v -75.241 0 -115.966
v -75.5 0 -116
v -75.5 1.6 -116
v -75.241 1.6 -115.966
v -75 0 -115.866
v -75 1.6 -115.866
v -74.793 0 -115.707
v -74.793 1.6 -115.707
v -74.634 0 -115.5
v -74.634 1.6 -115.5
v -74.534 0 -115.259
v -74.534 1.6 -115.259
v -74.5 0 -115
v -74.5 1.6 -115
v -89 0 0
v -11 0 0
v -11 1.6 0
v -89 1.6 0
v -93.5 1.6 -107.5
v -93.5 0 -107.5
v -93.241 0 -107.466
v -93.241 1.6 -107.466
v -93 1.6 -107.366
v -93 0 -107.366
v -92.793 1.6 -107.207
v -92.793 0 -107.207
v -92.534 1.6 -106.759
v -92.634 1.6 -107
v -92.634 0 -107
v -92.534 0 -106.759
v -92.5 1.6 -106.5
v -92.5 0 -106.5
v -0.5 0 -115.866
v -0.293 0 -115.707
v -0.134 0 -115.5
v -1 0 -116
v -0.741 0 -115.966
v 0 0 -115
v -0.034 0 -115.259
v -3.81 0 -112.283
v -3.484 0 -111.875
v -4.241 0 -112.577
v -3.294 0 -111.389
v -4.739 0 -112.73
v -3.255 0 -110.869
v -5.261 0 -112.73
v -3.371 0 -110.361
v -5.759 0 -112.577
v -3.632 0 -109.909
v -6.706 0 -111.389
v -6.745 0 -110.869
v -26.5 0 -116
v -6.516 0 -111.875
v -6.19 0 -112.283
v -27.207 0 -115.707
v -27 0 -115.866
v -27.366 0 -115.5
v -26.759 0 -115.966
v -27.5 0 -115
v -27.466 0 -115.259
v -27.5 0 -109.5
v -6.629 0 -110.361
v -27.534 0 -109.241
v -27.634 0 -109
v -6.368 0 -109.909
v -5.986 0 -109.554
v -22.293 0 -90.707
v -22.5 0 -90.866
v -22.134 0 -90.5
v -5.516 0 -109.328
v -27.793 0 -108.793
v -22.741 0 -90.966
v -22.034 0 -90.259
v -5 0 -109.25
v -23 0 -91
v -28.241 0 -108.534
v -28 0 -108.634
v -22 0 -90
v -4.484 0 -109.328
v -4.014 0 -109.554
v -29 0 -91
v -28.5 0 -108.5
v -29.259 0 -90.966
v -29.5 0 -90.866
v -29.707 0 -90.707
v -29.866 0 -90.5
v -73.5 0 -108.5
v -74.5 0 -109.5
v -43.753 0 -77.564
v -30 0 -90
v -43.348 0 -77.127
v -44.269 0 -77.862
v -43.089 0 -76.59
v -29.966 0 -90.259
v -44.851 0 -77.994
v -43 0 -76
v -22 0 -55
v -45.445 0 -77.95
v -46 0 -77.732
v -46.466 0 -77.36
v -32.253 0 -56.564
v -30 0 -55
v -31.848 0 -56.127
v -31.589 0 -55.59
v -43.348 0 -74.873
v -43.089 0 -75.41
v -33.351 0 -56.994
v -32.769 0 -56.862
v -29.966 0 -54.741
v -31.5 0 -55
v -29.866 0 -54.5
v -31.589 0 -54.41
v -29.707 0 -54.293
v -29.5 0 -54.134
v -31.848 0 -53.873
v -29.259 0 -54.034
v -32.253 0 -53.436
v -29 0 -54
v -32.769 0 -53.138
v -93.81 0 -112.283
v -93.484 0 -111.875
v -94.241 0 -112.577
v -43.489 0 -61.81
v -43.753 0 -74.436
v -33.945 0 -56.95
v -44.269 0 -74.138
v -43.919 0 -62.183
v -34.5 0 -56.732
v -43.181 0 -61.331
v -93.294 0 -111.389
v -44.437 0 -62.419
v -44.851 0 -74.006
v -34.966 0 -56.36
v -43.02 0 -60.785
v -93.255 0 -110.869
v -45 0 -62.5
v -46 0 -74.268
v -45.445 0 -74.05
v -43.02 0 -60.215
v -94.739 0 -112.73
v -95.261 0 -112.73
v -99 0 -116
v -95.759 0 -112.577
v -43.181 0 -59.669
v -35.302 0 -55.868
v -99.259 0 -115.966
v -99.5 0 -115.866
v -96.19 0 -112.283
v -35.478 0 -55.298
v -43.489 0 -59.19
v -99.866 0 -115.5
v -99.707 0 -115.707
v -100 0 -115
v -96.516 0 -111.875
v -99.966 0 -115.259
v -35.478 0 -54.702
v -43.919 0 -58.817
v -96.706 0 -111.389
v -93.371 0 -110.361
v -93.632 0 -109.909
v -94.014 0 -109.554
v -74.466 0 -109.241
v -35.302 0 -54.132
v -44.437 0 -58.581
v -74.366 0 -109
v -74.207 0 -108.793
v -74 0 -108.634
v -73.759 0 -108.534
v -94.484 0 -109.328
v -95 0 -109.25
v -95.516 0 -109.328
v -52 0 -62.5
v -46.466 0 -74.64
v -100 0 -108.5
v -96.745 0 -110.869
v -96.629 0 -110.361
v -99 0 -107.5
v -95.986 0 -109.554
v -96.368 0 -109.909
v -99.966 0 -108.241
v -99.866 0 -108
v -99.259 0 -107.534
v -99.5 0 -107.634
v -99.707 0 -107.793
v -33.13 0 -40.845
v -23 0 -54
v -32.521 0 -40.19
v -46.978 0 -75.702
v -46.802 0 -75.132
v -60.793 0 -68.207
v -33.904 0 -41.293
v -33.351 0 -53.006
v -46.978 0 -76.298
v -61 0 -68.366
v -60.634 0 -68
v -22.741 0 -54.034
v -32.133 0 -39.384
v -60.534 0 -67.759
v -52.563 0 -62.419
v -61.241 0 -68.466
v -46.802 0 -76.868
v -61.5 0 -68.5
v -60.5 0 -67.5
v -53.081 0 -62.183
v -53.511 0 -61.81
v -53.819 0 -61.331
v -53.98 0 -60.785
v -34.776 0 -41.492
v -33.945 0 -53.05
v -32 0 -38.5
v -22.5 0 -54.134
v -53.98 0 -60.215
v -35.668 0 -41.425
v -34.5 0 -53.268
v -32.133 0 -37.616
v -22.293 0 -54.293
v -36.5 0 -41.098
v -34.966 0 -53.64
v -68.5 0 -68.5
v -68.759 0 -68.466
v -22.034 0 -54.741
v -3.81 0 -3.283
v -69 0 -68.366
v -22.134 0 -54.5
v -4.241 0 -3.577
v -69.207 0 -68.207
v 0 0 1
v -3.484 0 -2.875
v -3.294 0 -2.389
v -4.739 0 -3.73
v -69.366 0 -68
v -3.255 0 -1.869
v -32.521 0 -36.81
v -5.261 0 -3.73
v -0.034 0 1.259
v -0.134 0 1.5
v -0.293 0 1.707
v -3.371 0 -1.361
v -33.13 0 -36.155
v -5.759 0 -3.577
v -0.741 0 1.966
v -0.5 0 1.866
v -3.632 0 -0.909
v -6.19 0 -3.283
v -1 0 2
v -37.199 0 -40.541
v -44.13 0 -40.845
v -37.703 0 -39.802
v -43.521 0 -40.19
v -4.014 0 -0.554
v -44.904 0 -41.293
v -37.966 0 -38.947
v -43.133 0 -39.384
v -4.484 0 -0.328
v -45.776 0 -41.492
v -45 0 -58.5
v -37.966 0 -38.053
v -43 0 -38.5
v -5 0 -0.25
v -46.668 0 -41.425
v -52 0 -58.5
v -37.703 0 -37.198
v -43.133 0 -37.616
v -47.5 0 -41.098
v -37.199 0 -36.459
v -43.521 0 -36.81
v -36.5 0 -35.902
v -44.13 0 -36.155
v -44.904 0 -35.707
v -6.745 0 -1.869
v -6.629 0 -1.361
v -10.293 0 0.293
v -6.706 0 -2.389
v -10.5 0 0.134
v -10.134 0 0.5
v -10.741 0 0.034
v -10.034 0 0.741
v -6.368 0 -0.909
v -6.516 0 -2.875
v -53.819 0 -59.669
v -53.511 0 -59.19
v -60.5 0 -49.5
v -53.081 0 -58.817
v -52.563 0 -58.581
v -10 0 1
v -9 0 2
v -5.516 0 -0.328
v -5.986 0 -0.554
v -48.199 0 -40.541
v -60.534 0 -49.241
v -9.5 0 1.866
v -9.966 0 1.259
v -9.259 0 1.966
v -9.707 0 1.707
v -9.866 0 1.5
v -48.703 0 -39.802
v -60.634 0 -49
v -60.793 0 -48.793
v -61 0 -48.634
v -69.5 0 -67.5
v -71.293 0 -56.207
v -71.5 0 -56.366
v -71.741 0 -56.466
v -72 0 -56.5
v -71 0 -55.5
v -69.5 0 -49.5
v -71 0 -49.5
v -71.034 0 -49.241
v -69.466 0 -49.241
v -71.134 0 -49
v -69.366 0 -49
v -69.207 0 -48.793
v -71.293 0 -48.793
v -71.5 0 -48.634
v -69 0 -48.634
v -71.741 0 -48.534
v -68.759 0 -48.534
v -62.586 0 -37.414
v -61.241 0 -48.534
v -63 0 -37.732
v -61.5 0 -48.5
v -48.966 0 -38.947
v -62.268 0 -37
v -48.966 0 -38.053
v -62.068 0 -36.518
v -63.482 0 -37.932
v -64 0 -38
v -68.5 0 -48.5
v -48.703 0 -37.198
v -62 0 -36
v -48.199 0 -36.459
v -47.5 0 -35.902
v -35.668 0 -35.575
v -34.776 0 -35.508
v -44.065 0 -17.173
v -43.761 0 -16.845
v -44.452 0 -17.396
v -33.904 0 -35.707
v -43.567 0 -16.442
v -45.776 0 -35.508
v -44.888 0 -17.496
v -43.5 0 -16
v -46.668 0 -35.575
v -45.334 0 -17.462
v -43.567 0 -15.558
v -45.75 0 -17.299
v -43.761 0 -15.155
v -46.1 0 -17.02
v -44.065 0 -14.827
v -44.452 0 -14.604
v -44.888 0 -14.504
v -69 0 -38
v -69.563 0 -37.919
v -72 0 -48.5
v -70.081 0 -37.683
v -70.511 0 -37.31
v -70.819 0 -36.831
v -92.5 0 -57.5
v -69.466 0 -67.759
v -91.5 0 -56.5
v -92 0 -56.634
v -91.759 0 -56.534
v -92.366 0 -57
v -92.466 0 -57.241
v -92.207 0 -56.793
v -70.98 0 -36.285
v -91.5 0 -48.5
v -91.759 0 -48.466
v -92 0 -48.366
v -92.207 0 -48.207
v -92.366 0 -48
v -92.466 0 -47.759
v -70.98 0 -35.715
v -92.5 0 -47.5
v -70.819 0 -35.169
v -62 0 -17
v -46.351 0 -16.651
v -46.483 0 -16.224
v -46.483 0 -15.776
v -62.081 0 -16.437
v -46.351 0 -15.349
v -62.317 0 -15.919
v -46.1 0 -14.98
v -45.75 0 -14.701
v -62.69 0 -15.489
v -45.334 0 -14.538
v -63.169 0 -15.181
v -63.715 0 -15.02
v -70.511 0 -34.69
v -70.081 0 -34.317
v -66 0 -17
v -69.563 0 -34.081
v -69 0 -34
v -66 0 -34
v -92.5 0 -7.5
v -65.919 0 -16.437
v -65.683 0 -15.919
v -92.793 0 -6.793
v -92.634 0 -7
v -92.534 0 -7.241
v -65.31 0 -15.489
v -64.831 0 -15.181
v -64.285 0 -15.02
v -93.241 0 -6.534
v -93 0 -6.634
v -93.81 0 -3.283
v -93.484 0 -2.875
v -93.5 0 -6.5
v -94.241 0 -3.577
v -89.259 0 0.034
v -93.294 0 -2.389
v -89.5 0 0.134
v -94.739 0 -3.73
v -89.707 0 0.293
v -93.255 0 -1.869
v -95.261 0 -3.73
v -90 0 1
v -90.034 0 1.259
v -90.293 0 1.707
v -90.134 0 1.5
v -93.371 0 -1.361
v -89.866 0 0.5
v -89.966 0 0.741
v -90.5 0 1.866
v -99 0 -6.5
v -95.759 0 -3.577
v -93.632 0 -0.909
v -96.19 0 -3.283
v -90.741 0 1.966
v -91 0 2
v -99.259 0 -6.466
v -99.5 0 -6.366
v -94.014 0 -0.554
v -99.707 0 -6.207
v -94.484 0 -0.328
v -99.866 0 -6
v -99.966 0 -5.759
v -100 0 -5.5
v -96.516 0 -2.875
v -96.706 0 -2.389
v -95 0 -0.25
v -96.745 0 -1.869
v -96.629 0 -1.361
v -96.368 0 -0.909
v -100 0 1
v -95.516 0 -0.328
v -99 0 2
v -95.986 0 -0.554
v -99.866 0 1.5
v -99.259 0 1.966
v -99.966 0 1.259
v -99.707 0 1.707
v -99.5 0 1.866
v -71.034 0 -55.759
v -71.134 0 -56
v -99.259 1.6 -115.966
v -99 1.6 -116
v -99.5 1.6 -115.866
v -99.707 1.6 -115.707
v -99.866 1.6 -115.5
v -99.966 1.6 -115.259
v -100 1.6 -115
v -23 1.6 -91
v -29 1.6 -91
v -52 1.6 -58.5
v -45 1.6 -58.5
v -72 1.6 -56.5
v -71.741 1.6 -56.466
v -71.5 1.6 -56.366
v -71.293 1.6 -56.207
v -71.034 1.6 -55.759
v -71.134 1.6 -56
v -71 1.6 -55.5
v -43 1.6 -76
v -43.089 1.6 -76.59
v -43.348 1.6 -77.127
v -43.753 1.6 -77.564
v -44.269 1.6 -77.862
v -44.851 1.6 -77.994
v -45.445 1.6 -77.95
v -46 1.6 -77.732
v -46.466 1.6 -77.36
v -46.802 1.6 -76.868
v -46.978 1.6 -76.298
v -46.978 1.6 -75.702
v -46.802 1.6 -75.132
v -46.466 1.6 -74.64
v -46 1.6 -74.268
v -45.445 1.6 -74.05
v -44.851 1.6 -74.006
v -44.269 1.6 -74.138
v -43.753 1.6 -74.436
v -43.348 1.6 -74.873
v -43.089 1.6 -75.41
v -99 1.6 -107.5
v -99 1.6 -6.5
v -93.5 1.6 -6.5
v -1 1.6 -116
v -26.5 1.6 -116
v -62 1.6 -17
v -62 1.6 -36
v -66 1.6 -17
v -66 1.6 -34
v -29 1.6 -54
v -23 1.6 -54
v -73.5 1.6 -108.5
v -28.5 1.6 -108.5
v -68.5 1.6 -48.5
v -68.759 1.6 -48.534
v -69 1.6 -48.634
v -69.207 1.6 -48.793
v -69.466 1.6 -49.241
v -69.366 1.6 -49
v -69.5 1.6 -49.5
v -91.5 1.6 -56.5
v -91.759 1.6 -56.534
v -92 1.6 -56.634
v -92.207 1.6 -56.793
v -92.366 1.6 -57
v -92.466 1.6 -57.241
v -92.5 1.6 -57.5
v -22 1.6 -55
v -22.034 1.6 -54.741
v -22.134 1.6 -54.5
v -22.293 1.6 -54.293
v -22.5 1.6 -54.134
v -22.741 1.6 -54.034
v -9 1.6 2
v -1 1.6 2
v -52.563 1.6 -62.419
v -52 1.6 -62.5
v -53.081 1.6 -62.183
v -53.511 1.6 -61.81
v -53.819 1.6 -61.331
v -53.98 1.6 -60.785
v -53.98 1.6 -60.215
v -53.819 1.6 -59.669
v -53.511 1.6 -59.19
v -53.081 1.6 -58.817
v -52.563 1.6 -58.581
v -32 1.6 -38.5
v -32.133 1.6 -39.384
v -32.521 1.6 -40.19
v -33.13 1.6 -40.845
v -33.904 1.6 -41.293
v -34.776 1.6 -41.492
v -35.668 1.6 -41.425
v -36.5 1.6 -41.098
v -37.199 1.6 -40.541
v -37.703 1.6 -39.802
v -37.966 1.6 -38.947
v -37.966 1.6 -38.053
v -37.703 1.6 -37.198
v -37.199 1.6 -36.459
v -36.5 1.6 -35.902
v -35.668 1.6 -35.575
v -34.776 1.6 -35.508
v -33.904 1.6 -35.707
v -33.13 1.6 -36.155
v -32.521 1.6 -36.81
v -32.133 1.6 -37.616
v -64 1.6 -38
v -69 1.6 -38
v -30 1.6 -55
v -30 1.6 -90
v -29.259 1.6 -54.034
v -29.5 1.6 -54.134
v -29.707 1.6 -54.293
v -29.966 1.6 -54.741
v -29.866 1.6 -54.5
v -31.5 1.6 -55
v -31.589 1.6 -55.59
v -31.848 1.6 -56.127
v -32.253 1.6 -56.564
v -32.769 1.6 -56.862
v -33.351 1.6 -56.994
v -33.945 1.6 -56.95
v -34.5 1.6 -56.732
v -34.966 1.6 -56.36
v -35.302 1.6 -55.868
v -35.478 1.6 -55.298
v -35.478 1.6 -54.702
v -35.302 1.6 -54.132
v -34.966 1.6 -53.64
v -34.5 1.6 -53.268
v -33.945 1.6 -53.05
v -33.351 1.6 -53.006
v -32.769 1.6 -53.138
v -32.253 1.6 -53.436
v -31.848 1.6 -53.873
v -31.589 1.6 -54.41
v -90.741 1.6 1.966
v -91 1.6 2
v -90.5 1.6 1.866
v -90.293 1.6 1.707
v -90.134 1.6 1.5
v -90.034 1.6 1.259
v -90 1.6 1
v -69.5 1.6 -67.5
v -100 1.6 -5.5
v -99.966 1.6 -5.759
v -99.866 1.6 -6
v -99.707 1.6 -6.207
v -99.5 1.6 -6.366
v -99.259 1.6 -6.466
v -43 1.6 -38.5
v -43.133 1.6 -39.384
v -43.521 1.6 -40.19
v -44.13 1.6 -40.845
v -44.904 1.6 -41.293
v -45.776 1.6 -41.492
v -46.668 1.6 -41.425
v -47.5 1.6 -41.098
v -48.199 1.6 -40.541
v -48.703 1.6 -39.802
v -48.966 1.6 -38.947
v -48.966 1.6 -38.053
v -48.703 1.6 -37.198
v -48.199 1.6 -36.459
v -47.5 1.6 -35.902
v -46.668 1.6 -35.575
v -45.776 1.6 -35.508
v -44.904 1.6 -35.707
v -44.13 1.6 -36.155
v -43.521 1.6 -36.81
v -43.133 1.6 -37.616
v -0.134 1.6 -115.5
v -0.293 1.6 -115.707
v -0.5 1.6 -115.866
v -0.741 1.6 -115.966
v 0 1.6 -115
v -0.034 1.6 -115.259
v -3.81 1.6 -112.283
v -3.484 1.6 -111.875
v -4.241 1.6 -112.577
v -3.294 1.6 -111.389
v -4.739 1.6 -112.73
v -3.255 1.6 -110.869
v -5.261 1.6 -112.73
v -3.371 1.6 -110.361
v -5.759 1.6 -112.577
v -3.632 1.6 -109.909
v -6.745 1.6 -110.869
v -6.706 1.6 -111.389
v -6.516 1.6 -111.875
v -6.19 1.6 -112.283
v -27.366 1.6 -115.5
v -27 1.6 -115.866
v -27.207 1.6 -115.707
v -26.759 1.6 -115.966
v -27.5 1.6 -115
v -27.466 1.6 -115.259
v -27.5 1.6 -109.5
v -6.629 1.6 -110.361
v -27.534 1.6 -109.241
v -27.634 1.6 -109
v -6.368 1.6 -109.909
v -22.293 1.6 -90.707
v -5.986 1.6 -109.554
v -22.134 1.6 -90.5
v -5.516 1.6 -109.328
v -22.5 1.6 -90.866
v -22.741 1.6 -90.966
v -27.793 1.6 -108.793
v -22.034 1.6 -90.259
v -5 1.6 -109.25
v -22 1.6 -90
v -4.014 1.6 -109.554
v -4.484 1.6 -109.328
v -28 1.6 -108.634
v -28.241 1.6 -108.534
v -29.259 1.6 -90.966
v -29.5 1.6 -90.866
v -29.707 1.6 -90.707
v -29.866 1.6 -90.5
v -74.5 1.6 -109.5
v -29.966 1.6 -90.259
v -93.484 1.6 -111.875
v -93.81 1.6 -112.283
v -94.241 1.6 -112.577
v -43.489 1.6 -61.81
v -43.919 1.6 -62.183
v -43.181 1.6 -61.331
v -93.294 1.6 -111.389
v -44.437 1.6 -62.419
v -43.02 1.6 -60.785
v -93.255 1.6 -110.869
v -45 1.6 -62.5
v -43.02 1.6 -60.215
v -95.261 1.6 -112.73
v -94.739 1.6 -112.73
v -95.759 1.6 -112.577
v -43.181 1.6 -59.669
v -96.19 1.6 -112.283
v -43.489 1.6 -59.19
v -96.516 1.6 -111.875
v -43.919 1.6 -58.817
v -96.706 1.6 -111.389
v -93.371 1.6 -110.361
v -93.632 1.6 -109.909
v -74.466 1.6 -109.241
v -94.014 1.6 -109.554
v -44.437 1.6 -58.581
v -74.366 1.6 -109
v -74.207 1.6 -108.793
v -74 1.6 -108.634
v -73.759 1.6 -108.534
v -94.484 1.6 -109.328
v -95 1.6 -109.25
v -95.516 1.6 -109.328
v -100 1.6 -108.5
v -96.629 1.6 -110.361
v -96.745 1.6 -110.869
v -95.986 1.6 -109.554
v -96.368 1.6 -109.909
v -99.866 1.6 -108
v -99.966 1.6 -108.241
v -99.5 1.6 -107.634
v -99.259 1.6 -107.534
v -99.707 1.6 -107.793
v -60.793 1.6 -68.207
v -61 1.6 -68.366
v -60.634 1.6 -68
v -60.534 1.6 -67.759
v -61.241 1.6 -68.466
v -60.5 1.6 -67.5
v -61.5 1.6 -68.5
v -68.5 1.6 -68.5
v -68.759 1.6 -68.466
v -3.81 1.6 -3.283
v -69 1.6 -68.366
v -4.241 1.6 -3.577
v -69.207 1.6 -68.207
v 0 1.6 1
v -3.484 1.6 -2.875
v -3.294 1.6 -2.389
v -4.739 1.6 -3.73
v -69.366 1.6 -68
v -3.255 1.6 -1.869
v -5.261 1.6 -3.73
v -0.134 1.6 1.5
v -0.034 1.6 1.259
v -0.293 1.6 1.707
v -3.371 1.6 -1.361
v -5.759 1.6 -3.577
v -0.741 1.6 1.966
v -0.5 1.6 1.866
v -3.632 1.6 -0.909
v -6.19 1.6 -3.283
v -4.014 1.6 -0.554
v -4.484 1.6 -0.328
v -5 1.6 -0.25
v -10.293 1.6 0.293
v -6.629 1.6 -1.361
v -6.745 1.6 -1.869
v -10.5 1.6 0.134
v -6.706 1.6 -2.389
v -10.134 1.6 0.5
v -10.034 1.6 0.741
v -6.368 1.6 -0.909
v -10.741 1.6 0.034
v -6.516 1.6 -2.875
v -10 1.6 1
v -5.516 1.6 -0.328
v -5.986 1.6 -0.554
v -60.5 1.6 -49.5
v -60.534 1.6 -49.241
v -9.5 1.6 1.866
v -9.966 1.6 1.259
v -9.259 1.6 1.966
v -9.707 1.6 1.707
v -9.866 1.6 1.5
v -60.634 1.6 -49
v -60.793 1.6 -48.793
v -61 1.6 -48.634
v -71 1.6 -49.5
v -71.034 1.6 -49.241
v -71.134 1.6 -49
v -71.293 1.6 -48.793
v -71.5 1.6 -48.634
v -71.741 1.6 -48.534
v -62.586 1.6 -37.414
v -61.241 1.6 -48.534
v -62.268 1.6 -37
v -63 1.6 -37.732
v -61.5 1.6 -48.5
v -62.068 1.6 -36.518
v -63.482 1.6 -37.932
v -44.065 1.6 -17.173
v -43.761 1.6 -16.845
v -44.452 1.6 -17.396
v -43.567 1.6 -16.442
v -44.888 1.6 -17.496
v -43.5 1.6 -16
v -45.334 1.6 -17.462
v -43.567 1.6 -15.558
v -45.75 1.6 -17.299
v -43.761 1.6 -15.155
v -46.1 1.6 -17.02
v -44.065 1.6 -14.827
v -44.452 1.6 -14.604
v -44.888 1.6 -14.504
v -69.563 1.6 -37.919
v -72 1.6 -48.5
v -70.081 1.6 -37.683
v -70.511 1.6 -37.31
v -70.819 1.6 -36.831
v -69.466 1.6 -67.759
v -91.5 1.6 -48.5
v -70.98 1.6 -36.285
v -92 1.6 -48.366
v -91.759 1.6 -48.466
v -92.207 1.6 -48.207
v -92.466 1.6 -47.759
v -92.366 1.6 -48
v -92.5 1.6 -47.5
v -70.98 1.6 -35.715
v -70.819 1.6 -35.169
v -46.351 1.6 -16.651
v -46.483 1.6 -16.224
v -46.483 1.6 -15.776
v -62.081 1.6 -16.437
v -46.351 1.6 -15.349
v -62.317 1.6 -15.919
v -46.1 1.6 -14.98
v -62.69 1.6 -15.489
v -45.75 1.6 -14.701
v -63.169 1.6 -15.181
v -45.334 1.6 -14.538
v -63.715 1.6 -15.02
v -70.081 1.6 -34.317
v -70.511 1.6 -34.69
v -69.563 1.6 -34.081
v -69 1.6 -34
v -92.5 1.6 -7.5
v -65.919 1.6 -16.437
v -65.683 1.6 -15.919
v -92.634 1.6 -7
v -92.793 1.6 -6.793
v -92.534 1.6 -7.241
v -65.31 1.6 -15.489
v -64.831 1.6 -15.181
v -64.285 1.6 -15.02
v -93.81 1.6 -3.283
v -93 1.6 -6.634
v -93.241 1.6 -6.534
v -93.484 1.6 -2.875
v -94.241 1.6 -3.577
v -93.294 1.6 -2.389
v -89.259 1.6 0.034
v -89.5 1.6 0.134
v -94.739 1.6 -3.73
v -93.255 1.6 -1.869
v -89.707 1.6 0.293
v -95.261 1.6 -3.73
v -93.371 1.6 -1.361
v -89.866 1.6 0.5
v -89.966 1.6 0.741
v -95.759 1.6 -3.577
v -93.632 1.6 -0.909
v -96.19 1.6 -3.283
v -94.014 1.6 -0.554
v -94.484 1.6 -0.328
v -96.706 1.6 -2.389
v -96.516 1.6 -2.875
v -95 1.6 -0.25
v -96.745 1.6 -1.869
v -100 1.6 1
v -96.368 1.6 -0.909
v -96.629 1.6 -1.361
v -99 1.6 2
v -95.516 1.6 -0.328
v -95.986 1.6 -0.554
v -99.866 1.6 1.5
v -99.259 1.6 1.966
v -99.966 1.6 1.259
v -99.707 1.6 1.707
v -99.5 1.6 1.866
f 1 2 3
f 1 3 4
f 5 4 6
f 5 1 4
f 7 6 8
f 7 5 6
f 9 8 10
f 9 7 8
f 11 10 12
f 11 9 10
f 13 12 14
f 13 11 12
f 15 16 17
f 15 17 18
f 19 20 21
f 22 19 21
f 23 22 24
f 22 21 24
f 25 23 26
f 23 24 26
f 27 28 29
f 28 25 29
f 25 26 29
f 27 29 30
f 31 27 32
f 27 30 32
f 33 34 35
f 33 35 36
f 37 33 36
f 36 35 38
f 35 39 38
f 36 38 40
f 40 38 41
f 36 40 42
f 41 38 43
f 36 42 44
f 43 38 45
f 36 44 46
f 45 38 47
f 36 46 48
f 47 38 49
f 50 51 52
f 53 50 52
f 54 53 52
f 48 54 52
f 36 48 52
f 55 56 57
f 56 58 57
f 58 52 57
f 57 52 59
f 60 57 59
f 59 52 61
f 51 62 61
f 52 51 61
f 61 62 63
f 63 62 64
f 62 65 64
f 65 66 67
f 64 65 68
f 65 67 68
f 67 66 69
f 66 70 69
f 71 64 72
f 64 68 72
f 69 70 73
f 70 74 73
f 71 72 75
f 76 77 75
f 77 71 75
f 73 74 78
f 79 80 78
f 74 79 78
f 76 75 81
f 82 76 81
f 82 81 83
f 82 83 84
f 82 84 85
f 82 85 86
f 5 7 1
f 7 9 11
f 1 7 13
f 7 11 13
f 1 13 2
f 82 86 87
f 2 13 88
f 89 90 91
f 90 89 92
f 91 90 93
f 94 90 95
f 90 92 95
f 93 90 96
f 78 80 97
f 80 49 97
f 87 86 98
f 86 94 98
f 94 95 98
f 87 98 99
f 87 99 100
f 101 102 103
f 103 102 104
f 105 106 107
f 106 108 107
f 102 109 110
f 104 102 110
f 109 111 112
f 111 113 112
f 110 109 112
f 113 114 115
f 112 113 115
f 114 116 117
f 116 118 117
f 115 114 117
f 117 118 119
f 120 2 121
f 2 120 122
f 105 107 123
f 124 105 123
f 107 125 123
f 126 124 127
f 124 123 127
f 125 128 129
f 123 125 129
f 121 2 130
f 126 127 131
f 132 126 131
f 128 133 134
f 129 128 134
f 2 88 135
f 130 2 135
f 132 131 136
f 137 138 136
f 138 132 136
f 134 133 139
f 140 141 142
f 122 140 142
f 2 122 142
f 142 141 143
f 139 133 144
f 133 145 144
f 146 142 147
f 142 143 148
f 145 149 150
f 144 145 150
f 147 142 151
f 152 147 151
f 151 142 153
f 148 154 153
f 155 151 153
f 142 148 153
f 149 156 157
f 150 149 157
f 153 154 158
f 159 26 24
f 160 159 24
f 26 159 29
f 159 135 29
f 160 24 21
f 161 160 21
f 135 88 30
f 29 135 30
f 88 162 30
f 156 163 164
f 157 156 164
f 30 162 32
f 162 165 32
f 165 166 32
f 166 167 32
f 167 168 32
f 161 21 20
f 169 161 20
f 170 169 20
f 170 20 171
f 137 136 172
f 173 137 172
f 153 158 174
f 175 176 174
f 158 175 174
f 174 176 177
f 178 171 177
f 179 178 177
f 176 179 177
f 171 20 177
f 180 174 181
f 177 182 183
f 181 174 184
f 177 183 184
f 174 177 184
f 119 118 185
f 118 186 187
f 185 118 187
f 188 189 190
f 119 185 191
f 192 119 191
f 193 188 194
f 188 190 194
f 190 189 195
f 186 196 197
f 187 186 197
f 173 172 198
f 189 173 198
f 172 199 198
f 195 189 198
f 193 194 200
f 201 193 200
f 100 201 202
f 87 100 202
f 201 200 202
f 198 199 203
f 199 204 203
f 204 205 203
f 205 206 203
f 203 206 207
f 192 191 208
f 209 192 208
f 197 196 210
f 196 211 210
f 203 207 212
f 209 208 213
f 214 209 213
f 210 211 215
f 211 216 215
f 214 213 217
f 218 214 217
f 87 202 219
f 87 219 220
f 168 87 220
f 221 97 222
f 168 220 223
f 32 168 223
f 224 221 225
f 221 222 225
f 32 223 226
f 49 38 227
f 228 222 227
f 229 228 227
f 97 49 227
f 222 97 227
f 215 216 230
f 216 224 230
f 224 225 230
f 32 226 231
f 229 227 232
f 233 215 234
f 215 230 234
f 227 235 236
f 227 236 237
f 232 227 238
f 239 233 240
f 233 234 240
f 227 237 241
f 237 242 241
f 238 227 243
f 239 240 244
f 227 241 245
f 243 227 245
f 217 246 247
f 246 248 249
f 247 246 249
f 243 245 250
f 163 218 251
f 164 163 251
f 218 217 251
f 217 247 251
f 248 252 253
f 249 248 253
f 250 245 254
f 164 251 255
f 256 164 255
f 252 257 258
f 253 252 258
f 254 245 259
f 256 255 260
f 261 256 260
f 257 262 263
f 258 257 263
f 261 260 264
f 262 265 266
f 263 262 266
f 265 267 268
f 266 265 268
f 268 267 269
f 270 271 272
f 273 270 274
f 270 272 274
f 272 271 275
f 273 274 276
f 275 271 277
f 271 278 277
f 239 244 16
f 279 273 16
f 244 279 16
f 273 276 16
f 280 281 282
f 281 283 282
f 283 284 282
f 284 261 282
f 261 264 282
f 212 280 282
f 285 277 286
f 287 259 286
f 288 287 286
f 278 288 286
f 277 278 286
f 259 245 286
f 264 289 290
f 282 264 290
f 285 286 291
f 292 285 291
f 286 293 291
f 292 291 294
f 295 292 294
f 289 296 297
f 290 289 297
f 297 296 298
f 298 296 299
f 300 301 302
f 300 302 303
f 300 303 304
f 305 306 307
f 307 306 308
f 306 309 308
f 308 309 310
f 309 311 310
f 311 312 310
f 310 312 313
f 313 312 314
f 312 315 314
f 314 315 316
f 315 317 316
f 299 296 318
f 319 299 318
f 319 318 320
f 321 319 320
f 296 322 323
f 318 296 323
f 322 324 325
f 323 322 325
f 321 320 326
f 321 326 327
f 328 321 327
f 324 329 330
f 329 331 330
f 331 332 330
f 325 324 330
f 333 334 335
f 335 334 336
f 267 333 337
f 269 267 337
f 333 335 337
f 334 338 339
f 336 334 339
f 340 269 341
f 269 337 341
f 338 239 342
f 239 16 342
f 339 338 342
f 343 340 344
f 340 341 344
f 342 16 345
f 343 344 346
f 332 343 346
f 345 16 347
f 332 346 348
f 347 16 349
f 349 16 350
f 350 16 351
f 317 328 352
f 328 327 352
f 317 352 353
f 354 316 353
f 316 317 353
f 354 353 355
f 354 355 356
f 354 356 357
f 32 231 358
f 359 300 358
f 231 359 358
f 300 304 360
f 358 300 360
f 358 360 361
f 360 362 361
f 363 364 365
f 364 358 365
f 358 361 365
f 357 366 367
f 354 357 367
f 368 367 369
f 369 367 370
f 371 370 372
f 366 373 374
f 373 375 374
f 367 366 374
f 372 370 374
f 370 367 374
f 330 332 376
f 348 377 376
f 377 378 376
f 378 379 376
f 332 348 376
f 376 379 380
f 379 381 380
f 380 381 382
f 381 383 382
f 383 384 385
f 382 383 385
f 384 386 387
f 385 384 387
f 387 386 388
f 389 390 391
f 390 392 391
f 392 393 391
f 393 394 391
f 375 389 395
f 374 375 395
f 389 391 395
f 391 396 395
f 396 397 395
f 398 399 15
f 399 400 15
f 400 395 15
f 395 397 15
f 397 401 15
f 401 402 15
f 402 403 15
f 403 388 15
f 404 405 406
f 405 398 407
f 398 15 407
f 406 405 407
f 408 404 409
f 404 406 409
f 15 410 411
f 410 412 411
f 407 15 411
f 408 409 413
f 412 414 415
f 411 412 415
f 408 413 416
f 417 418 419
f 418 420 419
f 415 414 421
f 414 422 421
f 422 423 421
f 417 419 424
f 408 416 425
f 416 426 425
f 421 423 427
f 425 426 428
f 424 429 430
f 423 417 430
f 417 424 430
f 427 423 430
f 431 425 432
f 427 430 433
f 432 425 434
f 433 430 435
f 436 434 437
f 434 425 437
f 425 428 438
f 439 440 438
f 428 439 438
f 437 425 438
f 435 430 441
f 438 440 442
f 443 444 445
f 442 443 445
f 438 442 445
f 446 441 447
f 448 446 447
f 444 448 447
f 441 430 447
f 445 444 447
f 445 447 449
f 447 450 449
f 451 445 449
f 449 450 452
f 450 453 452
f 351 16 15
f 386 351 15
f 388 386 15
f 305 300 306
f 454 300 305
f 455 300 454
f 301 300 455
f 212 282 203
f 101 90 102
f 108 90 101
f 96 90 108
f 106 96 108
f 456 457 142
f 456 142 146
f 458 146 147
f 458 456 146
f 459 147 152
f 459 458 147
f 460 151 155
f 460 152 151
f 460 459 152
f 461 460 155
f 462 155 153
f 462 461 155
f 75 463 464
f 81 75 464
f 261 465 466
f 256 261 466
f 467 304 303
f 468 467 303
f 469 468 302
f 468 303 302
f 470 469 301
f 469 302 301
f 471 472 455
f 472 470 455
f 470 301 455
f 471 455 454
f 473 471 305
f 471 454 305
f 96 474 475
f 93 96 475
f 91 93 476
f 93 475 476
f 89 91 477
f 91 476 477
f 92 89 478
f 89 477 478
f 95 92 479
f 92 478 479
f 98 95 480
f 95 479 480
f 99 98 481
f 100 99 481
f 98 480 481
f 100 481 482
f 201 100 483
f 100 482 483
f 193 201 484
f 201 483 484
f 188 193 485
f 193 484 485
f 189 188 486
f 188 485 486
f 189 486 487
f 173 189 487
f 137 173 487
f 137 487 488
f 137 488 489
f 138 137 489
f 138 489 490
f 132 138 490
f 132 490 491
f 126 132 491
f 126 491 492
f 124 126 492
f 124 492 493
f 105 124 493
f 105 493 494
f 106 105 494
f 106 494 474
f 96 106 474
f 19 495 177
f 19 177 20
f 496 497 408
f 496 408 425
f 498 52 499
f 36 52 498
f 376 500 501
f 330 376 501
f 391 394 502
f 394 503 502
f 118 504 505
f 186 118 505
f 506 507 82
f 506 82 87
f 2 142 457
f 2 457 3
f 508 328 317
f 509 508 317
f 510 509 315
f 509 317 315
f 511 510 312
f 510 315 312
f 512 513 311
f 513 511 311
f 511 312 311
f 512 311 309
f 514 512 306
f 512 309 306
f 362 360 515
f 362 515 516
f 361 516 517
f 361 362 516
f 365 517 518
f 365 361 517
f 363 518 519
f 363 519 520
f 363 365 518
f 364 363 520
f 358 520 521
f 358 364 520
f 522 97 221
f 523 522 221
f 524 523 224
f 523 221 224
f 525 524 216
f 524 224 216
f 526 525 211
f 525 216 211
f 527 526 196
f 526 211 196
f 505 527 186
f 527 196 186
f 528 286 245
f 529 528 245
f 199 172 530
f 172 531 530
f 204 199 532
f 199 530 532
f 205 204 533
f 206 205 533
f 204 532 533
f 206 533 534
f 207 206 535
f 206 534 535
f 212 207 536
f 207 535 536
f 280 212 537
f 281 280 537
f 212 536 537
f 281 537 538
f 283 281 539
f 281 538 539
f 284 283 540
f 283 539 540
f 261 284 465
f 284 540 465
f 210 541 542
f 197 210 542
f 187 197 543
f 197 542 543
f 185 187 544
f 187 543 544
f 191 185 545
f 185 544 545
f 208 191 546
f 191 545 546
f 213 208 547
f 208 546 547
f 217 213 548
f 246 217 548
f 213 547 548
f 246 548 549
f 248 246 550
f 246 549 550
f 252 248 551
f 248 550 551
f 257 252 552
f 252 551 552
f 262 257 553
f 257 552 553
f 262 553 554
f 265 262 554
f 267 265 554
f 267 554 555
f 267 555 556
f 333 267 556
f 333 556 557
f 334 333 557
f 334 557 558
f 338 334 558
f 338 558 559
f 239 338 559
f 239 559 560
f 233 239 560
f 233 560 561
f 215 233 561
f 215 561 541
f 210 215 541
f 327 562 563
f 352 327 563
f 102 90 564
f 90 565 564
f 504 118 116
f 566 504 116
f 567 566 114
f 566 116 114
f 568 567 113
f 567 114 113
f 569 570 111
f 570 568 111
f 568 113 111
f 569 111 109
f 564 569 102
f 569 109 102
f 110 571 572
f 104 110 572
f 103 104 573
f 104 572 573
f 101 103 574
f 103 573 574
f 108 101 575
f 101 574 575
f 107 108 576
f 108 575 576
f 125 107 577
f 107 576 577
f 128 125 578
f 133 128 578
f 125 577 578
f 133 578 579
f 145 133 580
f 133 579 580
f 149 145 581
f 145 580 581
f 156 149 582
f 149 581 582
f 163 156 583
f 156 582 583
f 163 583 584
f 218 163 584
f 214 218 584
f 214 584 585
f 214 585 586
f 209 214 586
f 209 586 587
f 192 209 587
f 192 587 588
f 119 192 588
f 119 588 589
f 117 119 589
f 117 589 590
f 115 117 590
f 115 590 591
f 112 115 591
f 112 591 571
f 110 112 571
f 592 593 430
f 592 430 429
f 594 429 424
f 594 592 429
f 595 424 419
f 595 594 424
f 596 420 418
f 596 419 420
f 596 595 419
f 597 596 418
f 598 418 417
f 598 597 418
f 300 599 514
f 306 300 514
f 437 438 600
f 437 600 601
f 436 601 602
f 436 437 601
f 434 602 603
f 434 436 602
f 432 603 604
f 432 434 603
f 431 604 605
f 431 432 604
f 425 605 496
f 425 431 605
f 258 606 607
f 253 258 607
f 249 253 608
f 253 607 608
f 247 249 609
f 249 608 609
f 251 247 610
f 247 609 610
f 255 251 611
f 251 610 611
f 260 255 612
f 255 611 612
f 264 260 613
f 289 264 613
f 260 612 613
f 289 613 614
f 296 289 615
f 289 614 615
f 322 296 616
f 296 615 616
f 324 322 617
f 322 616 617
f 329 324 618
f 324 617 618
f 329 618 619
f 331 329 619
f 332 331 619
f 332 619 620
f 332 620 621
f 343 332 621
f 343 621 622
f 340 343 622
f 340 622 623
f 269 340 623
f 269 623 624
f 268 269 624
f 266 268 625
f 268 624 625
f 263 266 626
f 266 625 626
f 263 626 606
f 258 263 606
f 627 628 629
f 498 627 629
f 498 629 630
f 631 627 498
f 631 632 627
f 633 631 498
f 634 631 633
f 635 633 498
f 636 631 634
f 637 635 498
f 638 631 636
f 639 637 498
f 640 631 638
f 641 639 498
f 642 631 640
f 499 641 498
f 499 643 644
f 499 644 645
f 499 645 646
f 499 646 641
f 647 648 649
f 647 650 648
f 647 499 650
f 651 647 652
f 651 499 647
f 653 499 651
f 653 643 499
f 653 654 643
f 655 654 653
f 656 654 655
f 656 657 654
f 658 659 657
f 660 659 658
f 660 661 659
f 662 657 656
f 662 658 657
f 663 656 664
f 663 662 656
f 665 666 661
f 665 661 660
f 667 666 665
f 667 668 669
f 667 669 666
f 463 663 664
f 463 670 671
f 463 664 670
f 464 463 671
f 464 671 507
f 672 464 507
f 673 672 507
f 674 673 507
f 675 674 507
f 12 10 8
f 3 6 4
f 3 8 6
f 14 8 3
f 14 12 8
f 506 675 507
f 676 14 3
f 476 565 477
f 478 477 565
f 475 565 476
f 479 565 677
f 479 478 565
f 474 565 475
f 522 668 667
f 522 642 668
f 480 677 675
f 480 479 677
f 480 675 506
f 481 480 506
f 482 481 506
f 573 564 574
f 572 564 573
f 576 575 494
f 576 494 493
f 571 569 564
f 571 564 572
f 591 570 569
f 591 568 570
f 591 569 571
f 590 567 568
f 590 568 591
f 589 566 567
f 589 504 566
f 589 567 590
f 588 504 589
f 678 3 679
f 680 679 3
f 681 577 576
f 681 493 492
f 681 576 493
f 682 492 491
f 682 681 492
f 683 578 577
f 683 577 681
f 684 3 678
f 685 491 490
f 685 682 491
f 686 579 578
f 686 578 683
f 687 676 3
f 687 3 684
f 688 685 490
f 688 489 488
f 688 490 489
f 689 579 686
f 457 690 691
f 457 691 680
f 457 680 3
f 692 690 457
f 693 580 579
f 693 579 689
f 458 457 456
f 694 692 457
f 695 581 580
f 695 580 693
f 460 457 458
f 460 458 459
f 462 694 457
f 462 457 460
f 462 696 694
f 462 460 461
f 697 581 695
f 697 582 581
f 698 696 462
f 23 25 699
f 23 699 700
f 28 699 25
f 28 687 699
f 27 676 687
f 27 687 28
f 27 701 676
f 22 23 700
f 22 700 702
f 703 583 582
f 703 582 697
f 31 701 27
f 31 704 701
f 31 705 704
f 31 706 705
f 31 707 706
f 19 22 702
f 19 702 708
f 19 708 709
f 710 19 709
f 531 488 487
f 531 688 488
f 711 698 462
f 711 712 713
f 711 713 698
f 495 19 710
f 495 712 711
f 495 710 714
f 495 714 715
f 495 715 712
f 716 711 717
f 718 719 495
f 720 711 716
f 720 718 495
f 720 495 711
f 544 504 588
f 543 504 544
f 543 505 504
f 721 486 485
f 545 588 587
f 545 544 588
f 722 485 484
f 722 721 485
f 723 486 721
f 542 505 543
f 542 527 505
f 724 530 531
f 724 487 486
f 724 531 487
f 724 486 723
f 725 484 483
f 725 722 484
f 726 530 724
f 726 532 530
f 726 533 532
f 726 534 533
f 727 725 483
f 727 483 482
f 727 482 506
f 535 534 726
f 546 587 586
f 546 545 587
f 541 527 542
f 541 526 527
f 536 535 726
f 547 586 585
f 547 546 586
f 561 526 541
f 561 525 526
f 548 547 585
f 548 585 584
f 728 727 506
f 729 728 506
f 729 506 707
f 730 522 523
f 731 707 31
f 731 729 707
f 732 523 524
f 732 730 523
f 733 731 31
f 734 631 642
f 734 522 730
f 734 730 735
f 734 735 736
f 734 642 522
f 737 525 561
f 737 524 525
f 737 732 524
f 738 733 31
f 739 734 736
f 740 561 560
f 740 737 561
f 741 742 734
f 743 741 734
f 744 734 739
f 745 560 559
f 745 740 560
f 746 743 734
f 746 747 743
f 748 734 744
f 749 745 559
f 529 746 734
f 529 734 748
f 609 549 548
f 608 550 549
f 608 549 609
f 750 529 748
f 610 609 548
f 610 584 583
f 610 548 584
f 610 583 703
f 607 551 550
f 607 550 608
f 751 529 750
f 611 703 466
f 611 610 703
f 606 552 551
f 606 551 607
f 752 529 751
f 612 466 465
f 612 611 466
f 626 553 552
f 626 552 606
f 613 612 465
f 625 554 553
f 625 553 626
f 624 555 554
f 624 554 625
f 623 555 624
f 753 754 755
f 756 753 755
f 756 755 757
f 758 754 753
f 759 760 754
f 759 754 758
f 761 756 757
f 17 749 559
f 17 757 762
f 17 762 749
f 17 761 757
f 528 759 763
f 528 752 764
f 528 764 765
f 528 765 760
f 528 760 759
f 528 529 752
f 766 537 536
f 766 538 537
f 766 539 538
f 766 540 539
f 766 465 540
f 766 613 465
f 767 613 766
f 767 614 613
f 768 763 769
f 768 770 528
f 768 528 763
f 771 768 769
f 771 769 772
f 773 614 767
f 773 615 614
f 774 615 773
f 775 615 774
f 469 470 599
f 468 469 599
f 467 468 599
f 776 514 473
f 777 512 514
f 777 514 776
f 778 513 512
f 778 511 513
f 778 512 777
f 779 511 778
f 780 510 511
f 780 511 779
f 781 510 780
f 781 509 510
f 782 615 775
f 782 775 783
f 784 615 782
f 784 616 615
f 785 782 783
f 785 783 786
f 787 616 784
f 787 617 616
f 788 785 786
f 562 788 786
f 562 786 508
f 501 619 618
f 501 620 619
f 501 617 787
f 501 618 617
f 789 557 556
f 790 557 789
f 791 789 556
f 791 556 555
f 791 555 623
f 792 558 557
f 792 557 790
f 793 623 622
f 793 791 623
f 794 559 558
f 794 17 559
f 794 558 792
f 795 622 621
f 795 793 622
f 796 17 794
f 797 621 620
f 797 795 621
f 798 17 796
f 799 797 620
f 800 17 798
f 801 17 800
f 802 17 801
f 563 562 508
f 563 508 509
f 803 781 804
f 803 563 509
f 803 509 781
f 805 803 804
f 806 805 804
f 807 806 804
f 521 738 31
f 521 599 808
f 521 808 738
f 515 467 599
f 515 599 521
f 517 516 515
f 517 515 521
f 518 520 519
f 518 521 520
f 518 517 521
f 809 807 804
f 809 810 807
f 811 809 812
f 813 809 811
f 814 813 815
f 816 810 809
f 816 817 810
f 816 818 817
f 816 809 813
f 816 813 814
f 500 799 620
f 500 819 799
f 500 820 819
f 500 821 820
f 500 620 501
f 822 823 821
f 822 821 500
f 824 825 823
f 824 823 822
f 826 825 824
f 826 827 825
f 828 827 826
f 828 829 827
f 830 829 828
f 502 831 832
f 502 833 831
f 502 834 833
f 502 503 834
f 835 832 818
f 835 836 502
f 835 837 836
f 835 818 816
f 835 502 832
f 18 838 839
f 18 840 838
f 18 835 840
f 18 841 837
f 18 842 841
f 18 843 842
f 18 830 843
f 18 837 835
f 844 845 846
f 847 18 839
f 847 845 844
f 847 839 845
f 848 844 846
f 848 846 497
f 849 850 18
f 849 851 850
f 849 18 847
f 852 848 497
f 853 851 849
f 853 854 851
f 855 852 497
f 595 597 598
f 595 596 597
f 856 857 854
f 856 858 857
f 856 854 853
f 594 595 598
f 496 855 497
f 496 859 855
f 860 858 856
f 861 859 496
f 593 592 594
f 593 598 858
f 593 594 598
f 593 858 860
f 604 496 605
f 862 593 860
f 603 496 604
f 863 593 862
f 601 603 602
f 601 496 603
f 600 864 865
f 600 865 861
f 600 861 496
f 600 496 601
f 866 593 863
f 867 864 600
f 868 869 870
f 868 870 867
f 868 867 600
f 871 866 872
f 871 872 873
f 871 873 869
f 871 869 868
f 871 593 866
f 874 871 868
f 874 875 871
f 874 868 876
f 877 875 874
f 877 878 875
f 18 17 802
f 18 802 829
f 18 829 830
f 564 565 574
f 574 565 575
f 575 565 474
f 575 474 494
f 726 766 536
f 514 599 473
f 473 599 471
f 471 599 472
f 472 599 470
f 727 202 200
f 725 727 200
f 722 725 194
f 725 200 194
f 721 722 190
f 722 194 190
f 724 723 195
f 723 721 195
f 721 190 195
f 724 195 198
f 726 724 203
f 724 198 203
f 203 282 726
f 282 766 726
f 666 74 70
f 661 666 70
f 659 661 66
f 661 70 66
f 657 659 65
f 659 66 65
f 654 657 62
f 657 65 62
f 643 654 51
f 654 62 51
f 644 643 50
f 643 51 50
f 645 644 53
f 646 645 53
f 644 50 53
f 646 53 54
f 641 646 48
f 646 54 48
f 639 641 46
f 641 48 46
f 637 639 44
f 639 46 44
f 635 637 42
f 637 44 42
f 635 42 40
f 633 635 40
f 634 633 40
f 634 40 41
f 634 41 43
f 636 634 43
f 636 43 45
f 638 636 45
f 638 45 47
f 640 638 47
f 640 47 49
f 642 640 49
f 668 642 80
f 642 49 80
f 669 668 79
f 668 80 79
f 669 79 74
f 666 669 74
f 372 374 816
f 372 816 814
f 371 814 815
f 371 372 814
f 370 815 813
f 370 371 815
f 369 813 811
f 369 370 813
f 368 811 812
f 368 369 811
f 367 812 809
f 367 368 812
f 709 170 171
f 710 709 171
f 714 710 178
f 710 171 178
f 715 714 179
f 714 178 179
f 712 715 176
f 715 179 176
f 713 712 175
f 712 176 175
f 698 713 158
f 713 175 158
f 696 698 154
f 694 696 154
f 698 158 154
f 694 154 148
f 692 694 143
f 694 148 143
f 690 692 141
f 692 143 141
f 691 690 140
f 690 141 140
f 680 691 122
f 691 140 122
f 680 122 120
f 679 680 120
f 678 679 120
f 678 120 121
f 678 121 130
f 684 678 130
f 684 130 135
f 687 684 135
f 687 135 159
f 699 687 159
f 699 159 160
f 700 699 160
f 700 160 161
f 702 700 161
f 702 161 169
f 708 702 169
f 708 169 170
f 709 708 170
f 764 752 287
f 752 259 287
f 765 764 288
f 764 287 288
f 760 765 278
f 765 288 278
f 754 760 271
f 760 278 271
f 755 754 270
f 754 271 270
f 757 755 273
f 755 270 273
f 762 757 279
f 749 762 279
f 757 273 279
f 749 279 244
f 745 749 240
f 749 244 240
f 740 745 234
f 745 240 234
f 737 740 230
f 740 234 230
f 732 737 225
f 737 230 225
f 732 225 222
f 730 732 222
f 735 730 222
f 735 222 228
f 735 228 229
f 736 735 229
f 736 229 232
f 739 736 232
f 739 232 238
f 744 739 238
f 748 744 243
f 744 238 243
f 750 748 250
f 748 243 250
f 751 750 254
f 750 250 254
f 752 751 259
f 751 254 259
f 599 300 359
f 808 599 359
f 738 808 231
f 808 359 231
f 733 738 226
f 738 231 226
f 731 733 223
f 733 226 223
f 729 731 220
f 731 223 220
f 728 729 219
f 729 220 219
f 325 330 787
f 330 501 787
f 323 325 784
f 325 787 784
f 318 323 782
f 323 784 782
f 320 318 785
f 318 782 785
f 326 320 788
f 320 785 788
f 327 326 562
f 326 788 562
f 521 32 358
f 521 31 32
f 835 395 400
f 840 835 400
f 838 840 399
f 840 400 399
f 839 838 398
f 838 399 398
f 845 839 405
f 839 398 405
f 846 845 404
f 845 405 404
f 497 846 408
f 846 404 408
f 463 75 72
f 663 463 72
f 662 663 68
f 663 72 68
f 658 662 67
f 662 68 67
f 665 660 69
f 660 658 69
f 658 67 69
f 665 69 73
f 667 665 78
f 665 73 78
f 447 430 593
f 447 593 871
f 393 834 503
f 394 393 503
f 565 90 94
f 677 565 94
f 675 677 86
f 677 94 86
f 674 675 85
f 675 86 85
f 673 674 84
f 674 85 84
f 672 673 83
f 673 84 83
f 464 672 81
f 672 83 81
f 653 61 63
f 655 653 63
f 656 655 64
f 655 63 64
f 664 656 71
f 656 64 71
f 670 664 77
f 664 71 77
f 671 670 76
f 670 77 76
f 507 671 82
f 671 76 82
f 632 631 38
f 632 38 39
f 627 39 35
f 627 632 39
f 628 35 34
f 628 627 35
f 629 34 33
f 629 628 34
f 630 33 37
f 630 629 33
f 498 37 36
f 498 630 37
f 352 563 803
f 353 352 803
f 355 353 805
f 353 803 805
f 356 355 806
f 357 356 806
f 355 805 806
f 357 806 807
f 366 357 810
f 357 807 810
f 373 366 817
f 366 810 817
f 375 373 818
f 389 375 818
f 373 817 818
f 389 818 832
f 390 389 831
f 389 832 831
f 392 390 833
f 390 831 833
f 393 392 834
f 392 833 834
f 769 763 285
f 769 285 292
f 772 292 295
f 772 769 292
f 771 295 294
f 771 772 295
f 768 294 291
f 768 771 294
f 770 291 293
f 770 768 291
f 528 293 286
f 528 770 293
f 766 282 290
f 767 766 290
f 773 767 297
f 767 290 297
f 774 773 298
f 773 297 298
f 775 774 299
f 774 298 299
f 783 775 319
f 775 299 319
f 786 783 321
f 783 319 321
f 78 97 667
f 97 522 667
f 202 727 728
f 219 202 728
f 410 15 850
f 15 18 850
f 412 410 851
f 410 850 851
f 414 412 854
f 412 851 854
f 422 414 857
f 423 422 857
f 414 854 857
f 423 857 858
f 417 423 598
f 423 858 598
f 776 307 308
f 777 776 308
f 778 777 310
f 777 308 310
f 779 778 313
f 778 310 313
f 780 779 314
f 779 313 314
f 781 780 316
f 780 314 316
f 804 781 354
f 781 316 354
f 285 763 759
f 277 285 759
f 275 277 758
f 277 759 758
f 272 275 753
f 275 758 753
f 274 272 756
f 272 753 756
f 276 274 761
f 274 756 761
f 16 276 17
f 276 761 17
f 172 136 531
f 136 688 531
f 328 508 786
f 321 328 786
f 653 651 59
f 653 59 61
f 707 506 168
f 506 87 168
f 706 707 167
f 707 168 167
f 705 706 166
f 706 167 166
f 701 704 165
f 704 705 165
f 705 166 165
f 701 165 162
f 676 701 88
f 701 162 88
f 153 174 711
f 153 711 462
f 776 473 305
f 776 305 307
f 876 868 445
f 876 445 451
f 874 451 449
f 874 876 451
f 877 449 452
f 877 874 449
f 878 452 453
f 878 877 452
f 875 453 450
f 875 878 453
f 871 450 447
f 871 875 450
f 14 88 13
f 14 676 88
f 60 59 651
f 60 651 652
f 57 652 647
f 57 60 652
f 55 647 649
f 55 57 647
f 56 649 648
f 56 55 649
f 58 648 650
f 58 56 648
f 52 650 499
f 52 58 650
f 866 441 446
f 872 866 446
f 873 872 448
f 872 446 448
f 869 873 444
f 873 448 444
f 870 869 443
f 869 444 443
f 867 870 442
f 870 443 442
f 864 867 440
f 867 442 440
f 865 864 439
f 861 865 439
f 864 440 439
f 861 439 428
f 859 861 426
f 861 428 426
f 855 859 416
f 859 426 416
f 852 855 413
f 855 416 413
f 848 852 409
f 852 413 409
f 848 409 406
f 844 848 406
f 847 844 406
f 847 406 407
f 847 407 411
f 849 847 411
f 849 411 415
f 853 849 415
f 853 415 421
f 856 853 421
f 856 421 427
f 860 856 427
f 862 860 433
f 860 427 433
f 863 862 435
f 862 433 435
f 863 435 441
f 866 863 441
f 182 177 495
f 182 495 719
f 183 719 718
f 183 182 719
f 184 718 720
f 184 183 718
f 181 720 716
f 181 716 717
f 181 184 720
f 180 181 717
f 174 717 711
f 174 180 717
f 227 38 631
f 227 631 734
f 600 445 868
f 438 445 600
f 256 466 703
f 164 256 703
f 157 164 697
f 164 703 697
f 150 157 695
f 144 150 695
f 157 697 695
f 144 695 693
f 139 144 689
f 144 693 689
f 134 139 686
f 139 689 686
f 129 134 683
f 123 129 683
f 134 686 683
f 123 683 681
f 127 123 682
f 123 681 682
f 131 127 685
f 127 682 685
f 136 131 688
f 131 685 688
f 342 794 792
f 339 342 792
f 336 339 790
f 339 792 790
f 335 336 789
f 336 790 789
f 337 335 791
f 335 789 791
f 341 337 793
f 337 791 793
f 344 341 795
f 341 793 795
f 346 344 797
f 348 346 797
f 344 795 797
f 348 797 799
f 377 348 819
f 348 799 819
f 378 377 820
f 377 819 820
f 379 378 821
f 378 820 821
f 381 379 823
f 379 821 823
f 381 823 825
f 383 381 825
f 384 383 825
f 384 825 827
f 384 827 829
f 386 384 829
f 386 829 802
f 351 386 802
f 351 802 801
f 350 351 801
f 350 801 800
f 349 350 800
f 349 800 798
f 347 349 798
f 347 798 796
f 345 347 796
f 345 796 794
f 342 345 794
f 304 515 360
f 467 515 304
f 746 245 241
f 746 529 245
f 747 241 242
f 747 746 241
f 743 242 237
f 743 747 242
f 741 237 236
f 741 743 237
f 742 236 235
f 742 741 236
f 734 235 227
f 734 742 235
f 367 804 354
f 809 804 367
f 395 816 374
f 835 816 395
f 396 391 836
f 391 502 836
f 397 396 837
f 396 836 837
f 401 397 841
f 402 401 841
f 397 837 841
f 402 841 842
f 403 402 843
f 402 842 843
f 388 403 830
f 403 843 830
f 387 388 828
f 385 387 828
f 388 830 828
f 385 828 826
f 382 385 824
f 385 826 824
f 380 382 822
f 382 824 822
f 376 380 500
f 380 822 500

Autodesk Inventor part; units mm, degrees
ref_plane "YZ Plane" through (0, 0, 0) normal (1, 0, 0) x (0, 1, 0)
ref_plane "XZ Plane" through (0, 0, 0) normal (0, 1, 0) x (-1, 0, 0)
ref_plane "XY Plane" through (0, 0, 0) normal (0, 0, 1) x (1, 0, 0)
sketch "Skizze1" plane through (0, 0, 0) normal (0, 1, 0) x (-1, 0, 0)
  line L0 (10, 0) -> (90, 0)
  line L1 (100, 0) -> (100, -116)
  line L2 (100, -116) -> (0, -116)
  line L3 (0, -116) -> (0, 0)
  line L4 (100, 0) -> (90, 0)
  line L5 (90, 0) -> (90, 2)
  line L6 (90, 2) -> (100, 2)
  line L7 (100, 2) -> (100, 0)
  line L8 (0, 0) -> (10, 0)
  line L9 (10, 0) -> (10, 2)
  line L10 (10, 2) -> (0, 2)
  line L11 (0, 2) -> (0, 0)
  dimension "d0" = 116
  dimension "d1" = 100
  dimension "d58" = 10
  dimension "d59" = 2
  dimension "d60" = 10
  dimension "d61" = 2
extrude "Extrusion1" add sketch "Skizze1" along normal blind 1.6
sketch "Skizze2" plane through (0, 1.6, 0) normal (0, 1, 0) x (1, 0, 0)
  line L0 (0, 116) -> (-100, 116) projected
  line L1 (-100, 116) -> (-100, -2) projected
  point P0 (0, 0)
  point P1 (-95, 111)
  point P2 (-100, 0)
  dimension "d4" = 5
  dimension "d5" = 5
hole "Bohrung1" at (-95, 1.6, -111) direction (0, -1, 0) diameter 3.5 end through all
pattern_linear "Rechteckige Anordnung1" count 2 spacing 109 along (0, 0, 1) count 2 spacing 90 along (1, 0, 0) of "Bohrung1"
sketch "Skizze3" plane through (0, 1.6, 0) normal (0, 1, 0) x (1, 0, 0)
  line L0 (-98.5, 8.5) -> (-94.5, 8.5)
  line L1 (-94.5, 8.5) -> (-94.5, 105.5)
  line L2 (-94.5, 105.5) -> (-98.5, 105.5)
  line L3 (-98.5, 105.5) -> (-98.5, 8.5)
  line L4 (-100, 116) -> (-100, -2) projected
  line L5 (0, 116) -> (-100, 116) projected
  line L6 (-94, 50.5) -> (-73, 50.5)
  line L7 (-73, 50.5) -> (-73, 54.5)
  line L8 (-73, 54.5) -> (-94, 54.5)
  line L9 (-94, 54.5) -> (-94, 50.5)
  line L10 (-72.5, 110.5) -> (-29.5, 110.5)
  line L11 (-29.5, 110.5) -> (-29.5, 114.5)
  line L12 (-29.5, 114.5) -> (-72.5, 114.5)
  line L13 (-72.5, 114.5) -> (-72.5, 110.5)
  line L14 (-28, 56) -> (-24, 56)
  line L15 (-24, 56) -> (-24, 89)
  line L16 (-24, 89) -> (-28, 89)
  line L17 (-28, 89) -> (-28, 56)
  line L18 (0, 0) -> (0, 116) projected
  line L19 (-67.5, 50.5) -> (-62.5, 50.5)
  line L20 (-62.5, 50.5) -> (-62.5, 66.5)
  line L21 (-62.5, 66.5) -> (-67.5, 66.5)
  line L22 (-67.5, 66.5) -> (-67.5, 50.5)
  line L23 (-71, 48.5) -> (-96, 48.5)
  line L24 (-96, 48.5) -> (-96, 56.5)
  line L25 (-96, 56.5) -> (-71, 56.5)
  line L26 (-71, 56.5) -> (-71, 48.5)
  line L27 (-92.5, 107.5) -> (-92.5, 6.5)
  line L28 (-92.5, 6.5) -> (-100.5, 6.5)
  line L29 (-100.5, 6.5) -> (-100.5, 107.5)
  line L30 (-100.5, 107.5) -> (-92.5, 107.5)
  line L31 (-69.5, 48.5) -> (-60.5, 48.5)
  line L32 (-60.5, 48.5) -> (-60.5, 68.5)
  line L33 (-60.5, 68.5) -> (-69.5, 68.5)
  line L34 (-69.5, 68.5) -> (-69.5, 48.5)
  line L35 (-27.5, 108.5) -> (-74.5, 108.5)
  line L36 (-74.5, 108.5) -> (-74.5, 116.5)
  line L37 (-74.5, 116.5) -> (-27.5, 116.5)
  line L38 (-27.5, 116.5) -> (-27.5, 108.5)
  line L39 (-30, 54) -> (-22, 54)
  line L40 (-22, 54) -> (-22, 91)
  line L41 (-22, 91) -> (-30, 91)
  line L42 (-30, 91) -> (-30, 54)
  point P0 (-100, 0)
  point P1 (-27.5, 116)
  point P2 (-74.5, 116)
  point P3 (-92.5, 48.5)
  point P4 (-92.5, 56.5)
  point P5 (-100, 107.5)
  point P6 (-100, 6.5)
  dimension "d19" = 97
  dimension "d20" = 4
  dimension "d21" = 1.5
  dimension "d22" = 10.5
  dimension "d23" = 4
  dimension "d24" = 21
  dimension "d25" = 61.5
  dimension "d26" = 6
  dimension "d27" = 43
  dimension "d28" = 4
  dimension "d29" = 1.5
  dimension "d30" = 27.5
  dimension "d31" = 4
  dimension "d32" = 33
  dimension "d33" = 24
  dimension "d34" = 27
  dimension "d47" = 5
  dimension "d48" = 16
  dimension "d49" = 0
  dimension "d50" = 62.5
  dimension "d53" = 2
  dimension "d54" = 2
  dimension "d55" = 2
  dimension "d56" = 2
  dimension "d57" = 2
extrude "Extrusion2" cut sketch "Skizze3" against normal through all contours L3 L2 L1 L25 L24 L23 L0 | L0 L1 L23 L27 L28 L4 L30 L25 L2 L3 | L23 L24 L25 L1 | L1 L25 L27 L8 L9 L6 L23 | L27 L6 L7 L8 L25 L26 L23 | L5 L38 L35 L36 | L27 L8 L7 L6 | L6 L9 L8 L27 | L13 L12 L11 L10 | L17 L16 L15 L14 | L22 L21 L20 L19 | L34 L33 L32 L31 | L42 L41 L40 L39
fillet "Rundung1" radius 1 28 edges at (-100, 0.8, 2) (-100, 0.8, -116) (-74.5, 0.8, -116) (-74.5, 0.8, -108.5) (-69.5, 0.8, -68.5) (-60.5, 0.8, -68.5) (-60.5, 0.8, -48.5) (-69.5, 0.8, -48.5) (-71, 0.8, -56.5) (-71, 0.8, -48.5) (-92.5, 0.8, -56.5) (-92.5, 0.8, -48.5) (-90, 0.8, 0) (-90, 0.8, 2) (-92.5, 0.8, -6.5) (-100, 0.8, -6.5) (-10, 0.8, 2) (-10, 0.8, 0) (0, 0.8, 2) (-22, 0.8, -54) (-30, 0.8, -54) (-30, 0.8, -91) (-22, 0.8, -91) (-27.5, 0.8, -108.5) (-27.5, 0.8, -116) (0, 0.8, -116) (-92.5, 0.8, -107.5) (-100, 0.8, -107.5)
sketch "Skizze4" plane through (0, 1.6, 0) normal (0, 1, 0) x (1, 0, 0)
  circle A0 centre (-45, 76) radius 2
  line L0 (-1, 116) -> (-26.5, 116) projected
  line L1 (0, -1) -> (0, 115) projected
  circle A1 centre (-33.5, 55) radius 2
  line L2 (-52, 60.5) -> (-45, 60.5) construction
  line L3 (-52, 58.5) -> (-45, 58.5)
  line L4 (-45, 62.5) -> (-52, 62.5)
  arc A2 (-52, 62.5) -> (-52, 58.5) centre (-52, 60.5) ccw
  arc A3 (-45, 58.5) -> (-45, 62.5) centre (-45, 60.5) ccw
  line L5 (-75.5, 116) -> (-99, 116) projected
  line L6 (-100, 115) -> (-100, 108.5) projected
  circle A4 centre (-46, 38.5) radius 3
  circle A5 centre (-35, 38.5) radius 3
  line L7 (-9, -2) -> (-1, -2) projected
  line L8 (-64, 17) -> (-64, 36) construction
  line L9 (-62, 17) -> (-62, 36)
  line L10 (-66, 36) -> (-66, 17)
  arc A6 (-66, 17) -> (-62, 17) centre (-64, 17) ccw
  arc A7 (-62, 36) -> (-66, 36) centre (-64, 36) ccw
  line L11 (-100, 5.5) -> (-100, -1) projected
  line L12 (-64, 36) -> (-69, 36) construction
  line L13 (-64, 38) -> (-69, 38)
  line L14 (-69, 34) -> (-64, 34)
  arc A8 (-64, 34) -> (-64, 38) centre (-64, 36) ccw
  arc A9 (-69, 38) -> (-69, 34) centre (-69, 36) ccw
  circle A10 centre (-45, 16) radius 1.5
  point P0 (0, 0)
  point P1 (-48.5, 60.5)
  point P2 (-64, 26.5)
  point P3 (-66.5, 36)
  dimension "d63" = 4
  dimension "d64" = 40
  dimension "d65" = 45
  dimension "d66" = 4
  dimension "d67" = 33.5
  dimension "d68" = 61
  dimension "d69" = 7
  dimension "d70" = 4
  dimension "d71" = 55.5
  dimension "d72" = 48
  dimension "d73" = 6
  dimension "d74" = 6
  dimension "d75" = 11
  dimension "d76" = 0
  dimension "d77" = 35
  dimension "d79" = 77.5
  dimension "d80" = 19
  dimension "d81" = 4
  dimension "d82" = 36
  dimension "d83" = 80
  dimension "d84" = 5
  dimension "d85" = 4
  dimension "d86" = 3
  dimension "d87" = 100
  dimension "d88" = 45
extrude "Ausklinkung1" cut sketch "Skizze4" against normal blind 2
equation "\"Biegeradius\" = Stärke"
equation "\"BreiteBiegungsfreistellung\" = Stärke"
equation "\"TiefeBiegungsfreistellung\" = 0.5 * Stärke"
equation "\"GrößeEckenfreistellung\" = 4 * Stärke"
equation "\"MinimalRest\" = 2 * Stärke"
equation "\"Übergangsradius\" = Biegeradius"
equation "\"JacobiRadiusGröße\" = Biegeradius"
equation "\"Abstandsgröße\" = Stärke"
equation "\"d89\" = Stärke"
equation "\"Stärke\" = 1.5"
properties part number "mainunitshield"
